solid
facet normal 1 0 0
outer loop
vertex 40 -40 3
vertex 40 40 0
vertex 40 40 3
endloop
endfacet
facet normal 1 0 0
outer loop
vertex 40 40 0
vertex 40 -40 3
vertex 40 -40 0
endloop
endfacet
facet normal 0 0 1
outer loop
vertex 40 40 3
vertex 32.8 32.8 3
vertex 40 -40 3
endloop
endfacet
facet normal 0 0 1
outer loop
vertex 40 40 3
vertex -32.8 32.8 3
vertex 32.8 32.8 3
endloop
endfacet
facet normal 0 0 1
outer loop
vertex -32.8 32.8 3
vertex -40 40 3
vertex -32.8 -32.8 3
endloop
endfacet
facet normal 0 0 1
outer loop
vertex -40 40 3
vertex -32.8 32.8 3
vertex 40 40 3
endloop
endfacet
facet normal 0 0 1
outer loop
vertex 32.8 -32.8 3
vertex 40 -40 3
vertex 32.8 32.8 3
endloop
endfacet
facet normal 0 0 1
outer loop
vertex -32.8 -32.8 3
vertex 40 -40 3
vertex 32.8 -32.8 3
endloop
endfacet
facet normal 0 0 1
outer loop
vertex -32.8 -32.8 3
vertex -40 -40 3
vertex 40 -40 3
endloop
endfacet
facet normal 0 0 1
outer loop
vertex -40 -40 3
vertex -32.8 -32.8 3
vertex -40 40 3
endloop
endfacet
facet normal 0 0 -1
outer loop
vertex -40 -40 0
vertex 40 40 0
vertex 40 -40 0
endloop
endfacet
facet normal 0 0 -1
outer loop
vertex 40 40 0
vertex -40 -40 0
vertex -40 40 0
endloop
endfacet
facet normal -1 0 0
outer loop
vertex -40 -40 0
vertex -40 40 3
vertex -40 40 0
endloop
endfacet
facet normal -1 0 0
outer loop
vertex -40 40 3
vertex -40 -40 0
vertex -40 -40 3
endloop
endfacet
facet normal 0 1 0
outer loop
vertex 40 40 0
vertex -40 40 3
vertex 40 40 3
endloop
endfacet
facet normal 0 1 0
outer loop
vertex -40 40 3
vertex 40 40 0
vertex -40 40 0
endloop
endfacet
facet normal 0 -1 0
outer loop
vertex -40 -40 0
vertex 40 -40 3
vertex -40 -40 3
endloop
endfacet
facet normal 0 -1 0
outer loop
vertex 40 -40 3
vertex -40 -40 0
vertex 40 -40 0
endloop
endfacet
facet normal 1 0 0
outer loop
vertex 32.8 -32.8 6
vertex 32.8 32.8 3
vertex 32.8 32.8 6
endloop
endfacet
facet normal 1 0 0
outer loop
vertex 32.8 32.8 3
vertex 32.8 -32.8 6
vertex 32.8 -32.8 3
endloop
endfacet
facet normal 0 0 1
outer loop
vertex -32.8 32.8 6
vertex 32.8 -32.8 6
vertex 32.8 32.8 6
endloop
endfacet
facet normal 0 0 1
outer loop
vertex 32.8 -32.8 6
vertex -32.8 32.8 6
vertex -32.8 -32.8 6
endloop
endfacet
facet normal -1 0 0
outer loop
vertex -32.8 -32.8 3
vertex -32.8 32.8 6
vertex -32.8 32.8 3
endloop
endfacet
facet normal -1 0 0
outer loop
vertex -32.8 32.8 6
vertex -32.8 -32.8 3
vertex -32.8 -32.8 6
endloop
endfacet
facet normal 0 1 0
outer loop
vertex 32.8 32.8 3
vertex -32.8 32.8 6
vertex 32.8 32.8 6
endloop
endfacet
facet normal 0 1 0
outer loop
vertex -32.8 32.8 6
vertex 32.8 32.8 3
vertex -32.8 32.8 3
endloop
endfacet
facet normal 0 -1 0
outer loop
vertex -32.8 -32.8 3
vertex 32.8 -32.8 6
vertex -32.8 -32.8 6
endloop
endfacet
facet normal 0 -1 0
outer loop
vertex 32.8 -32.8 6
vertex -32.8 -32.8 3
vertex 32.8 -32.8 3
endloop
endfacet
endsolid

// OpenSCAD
//////////VARIABLE DECLARATIONS//////////

//preview[view:north east, tilt: top diagonal]

//QR Code Data Display Method
add_sub = 2; //[1:Subtract QR Geometry,2:Add QR Geometry]

//QR Code Mirroring. No: QR code is scanable from top of object. Yes: QR code is scanable from bottom of object. NOTE: Code is already flipped for iPhone cases so it will be scanable from back of iPhone case.
code_flip = 0; //[0:No,1:Yes]

//Select Main Object
obj = 1; //[0:QR data only,1:Rectangle,2:iPhone 4,3:iPhone 5,4:Rectangle with hole]

//Thickness option for iPhone cases
case_thickness = 1.8; //[1.8:Slim,2.4:Sturdy]

//For rectangles only (will also round perimeters)
round_corner = 1; //[1:No,2:Yes]

//Two opposite corners or all four corners
corner_num = 0; //[0:Two,1:Four]

//For rectangles and perimeters only (will also round perimeters) (mm)
corner_radius = 10; 

//Width of object (mm)
tag_width = 80;

//Height of object (mm)
tag_height = 80;

//Thickness of object (mm)
tag_thickness = 3;

//X Location of hole center (for rectangle with hole) (mm)
hole_x = 30;

//Y Location of hole center (for rectanlge with hole) (mm)
hole_y = 0;

//Radius of hole (for rectanlge with hole) (mm)
hole_r = 10;

//Distance from tag edge. "-1000" for none. (works with all models, but uses tag_width, tag_height plus perimeter dimensions for size) (mm)
perimeter = -1000;

//Wall thickness of perimeter (mm)
per_w = 3;

//Wall height of perimeter (mm)
per_h = 10;

//Scale multiplier for code (base size: 1mm cubes make each code block) (multiplier)
qr_scale = 1.6;

//(DO NOT PUT IN 0 customizer won't generate stl, instead put in a very small value like 0.001 for no tolerance) Use for making a positive and negative assembly (+val makes code blocks bigger) (mm)
qr_tolerance = 0.001;

//X location of QR code center (mm)
qr_x = 0;

//Y location of QR code center (mm)
qr_y = 0;

//Z location of bottom of QR code gemometry (mm)
qr_bottom = 1;

//Thickness of QR code (mm)
qr_thickness = 5;

//Rotate QR code around z-axis (deg)
qr_rotate = 0;

//Input from data generator for dimention of QR code (copy and paste from QR SIZE.txt)
qr_size = 41;

//Input raw QR data matrix here (copy and paste from QR DATA.txt) ("5" will make a rectangle the size of the QR code bounding box driven by qr_size value entered above. NOTE: rectangle will be slightly larger than actual code data due to "white" pixels around QR code in image)
qr_data = 5;

qr_num = qr_size*qr_size;


//////////GEOMETRY MANIPULATION//////////

//Just qr data
if (obj == 0)
{
	qr_mover(qr_x, qr_y, qr_bottom, qr_rotate, qr_scale);
	if (perimeter != -1000)
	{
		perimeter();
	}
}

//Basic rectangle tag
if (obj == 1)
{
	if (add_sub == 1)
	{
		difference()
		{
			rec_tag(tag_width, tag_height, tag_thickness);
			qr_mover(qr_x, qr_y, qr_bottom, qr_rotate, qr_scale);
		}
	}
	if (add_sub == 2)
	{
		union()
		{
			rec_tag(tag_width, tag_height, tag_thickness);
			qr_mover(qr_x, qr_y, qr_bottom, qr_rotate, qr_scale);
		}
	}
	if (perimeter != -1000)
	{
		perimeter();
	}
}

//iPhone 4
if(obj == 2)
{
	if (add_sub == 1)
	{
		difference()
		{
			iPhone4Case();
			translate([0,0,qr_thickness-.1])
			rotate([180,0,0])
			qr_mover(qr_x, qr_y, qr_bottom, qr_rotate, qr_scale);
		}
	}
	if (add_sub == 2)
	{
		union()
		{
			iPhone4Case();
			translate([0,0,qr_thickness-.1])
			rotate([180,0,0])
			qr_mover(qr_x, qr_y, qr_bottom, qr_rotate, qr_scale);
		}
	}
}


//iPhone 5
if(obj == 3)
{
	if (add_sub == 1)
	{
		difference()
		{
			iPhone5Case();
			translate([0,0,qr_thickness-.1])
			rotate([180,0,0])
			qr_mover(qr_x, qr_y, qr_bottom, qr_rotate, qr_scale);
		}
	}
	if (add_sub == 2)
	{
		union()
		{
			iPhone5Case();
			translate([0,0,qr_thickness-.1])
			rotate([180,0,0])
			qr_mover(qr_x, qr_y, qr_bottom, qr_rotate, qr_scale);
		}
	}
}


//Rectangle with hole
if (obj == 4)
{
	if (add_sub == 1)
	{
		difference()
		{
			rec_tag(tag_width, tag_height, tag_thickness);
			qr_mover(qr_x, qr_y, qr_bottom, qr_rotate, qr_scale);
			translate([hole_x, hole_y, 1])
			cylinder(h=(2*tag_thickness), r=hole_r, center=true);
		}
	}
	if (add_sub == 2)
	{
		difference()
		{
			union()
			{
				rec_tag(tag_width, tag_height, tag_thickness);
				qr_mover(qr_x, qr_y, qr_bottom, qr_rotate, qr_scale);
			}
			translate([hole_x, hole_y, 1])
			cylinder(h=(2*tag_thickness), r=hole_r, center=true);
		}
	}
	if (perimeter != -1000)
	{
		perimeter();
	}
}


//////////MODULE DEFINITIONS//////////

module qr_volume(size, num, data, thickness, tol)
{
	if (qr_data == 5)
	{
		color("Snow")
		translate([0, 0, thickness/2])
		cube([size, size, thickness], center=true);
	}
	else
	{
		color("DarkGrey")
		union()
		{
			for(i = [1:1:num])
			{
				if(data[i-1] == 1)
				{
					translate([(floor(i/size)-(qr_size/2)),(i-(size*floor(i/size))-1-(qr_size/2)), 0])
					cube([1+tol, 1+tol, thickness],center=[.5,.5,0]);
				}
			}
		}
	}
}

module qr_mover(x, y, z, rotate, scale)
{
	translate([x,y,z])
	rotate([0, 0, rotate])
	scale([scale, scale, 1])
	mirror([0, code_flip, 0])
	qr_volume(qr_size, qr_num, qr_data, qr_thickness, qr_tolerance);
}

module corner_rounder(w, h, t)
{
	for (c = [0:1:corner_num])
	{
		union()
		{
			mirror([0, c, 0])
			difference()
			{
				translate([w/2, h/2, t/2])
				cylinder(h=t*2, r=corner_radius, center=true);
				translate([(w/2)-corner_radius, (h/2)-corner_radius, t/2])
				cylinder(h=t*3, r=corner_radius, center=true);
			}
			mirror([0, c, 0])
			difference()
			{
				translate([-w/2, -h/2, t/2])
				cylinder(h=t*2, r=corner_radius, center=true);
				translate([-(w/2)+corner_radius, -(h/2)+corner_radius, t/2])
				cylinder(h=t*3, r=corner_radius, center=true);
			}
		}
	}
}

module rec_tag(t_w, t_h, t_t)
{
	difference()
	{
		translate([0, 0, (t_t/2)])
		cube([t_w, t_h, t_t], center=true);
		if (round_corner == 2)
		{
			corner_rounder(t_w, t_h, t_t);
		}
	}
}

module perimeter()
{
	difference()
	{
		rec_tag(tag_width+perimeter+per_w, tag_height+perimeter+per_w, per_h);
		translate([0, 0, -1])
		rec_tag(tag_width+perimeter, tag_height+perimeter, per_h+2);
	}
}




//////////MAKERBOT IPHONE CASE//////////


/*Non customizer variables*/
caseThickness = case_thickness;
caseTolerance = .2/1;

4width=58.55/1;	
4length=115.15/1;
4height=9.34/1;
4cornerR = 8.77/1;
4swidth=6.17/1;
4sthick=.6/1;

5width = 57.57/1;
5length = 122.83/1;
5height = 7.6/1;
5cornerR = 9.28/1;
5sthick = 1.44/1;
5swidth = 5height - 5sthick*1.5;

heightvar=.24/1;

homebuttonR = 5.6/1;
homebuttonD = homebuttonR*2;

top_bottom_opening_width = 50/1;
leftholelength = 25.43/1;
leftholeR = 2.4/1;
topholelength = 38.57/1;
topholeR = 2.5/1;
bottomholelength1 = 43.97/1;
bottomholelength2 = 26.05/1;
bottombigR = 1.53/1;
bottomsmallR = 1.15/1;

corner_resolution = 6/1;
circle_resolution = corner_resolution*4;

fudge = .05/1;


//MODULES

module iPhoneGlass(w, l, h, r)
{
	union(){
		cube([w,l-r*2,h],center = true);
		cube([w-r*2,l,h],center = true);
		//top right corner
		translate([w/2-r,l/2-r,0])
			cylinder(	h = h,
						r = r,
						center = true,
						$fn = circle_resolution);
		//top left corner
		translate([-(w/2-r),l/2-r,0])
			cylinder(	h = h,
						r = r,
						center = true,
						$fn = circle_resolution);
		//bottom right corner
		translate([w/2-r,-(l/2-r),0])
			cylinder(	h = h,
					 	r = r,
						center = true,
						$fn = circle_resolution);
		//bottom left corner
		translate([-(w/2-r),-(l/2-r),0])
			cylinder(	h = h,
						r = r,
						center = true, 
						$fn = circle_resolution);
	}
}

module iPhoneStrip(	w, l, h, r, sw, st)
{
	union(){
		cube([w+st*2,l-r*2,sw],center = true);
		cube([w-r*2,l+st*2,sw],center = true);
		//top right corner
		translate([w/2-r,l/2-r,0])
			cylinder(	h = sw,
						r = r+st,
						center = true,
						$fn = circle_resolution);
		//top left corner
		translate([-(w/2-r),l/2-r,0])
			cylinder(	h = sw,
						r = r+st,
						center = true,
						$fn = circle_resolution);
		//bottom right corner
		translate([w/2-r,-(l/2-r),0])
			cylinder(	h = sw,
						r = r+st,
						center = true,
						$fn = circle_resolution);
		//bottom left corner
		translate([-(w/2-r),-(l/2-r),0])
			cylinder(	h = sw,
						r = r+st,
						center = true,
						$fn = circle_resolution);
	}
}

module iPhoneCameraHole(w,h,r){
	hull(){
		translate([w/2,0,0])
			cylinder(h = h,r = r,center = true, $fn = circle_resolution);
		translate([-w/2,0,0])
			cylinder(h = h,r = r,center = true, $fn = circle_resolution);
	}
}


module iPhone5(w,l,h,cR,sw,st){
	hull(){
		iPhoneGlass(w,l,h,cR);
		iPhoneStrip(w,l,h,cR,sw,st);
	}
}


module iPhone4(w,l,h,cR,sw,st){
	union(){
		hull(){
			iPhoneGlass(w,l,sw+st,cR);
			iPhoneStrip(w,l,h,cR,sw,st);
		}
		iPhoneGlass(w,l,h,cR);
	}
}

module iPhone5Case(){
	translate([0,0,(5height+caseThickness)/2]){
		difference(){
			hull(){
				iPhoneGlass(5width+caseThickness*2,5length+caseThickness*2,5height+caseThickness,5cornerR+caseThickness);
				iPhoneStrip(5width+caseThickness*2,5length+caseThickness*2,5height+caseThickness*2,5cornerR+caseThickness,5swidth,5sthick);
			}
			iPhone5(5width-caseTolerance*3,5length-caseTolerance*2,5height+caseTolerance,5cornerR,5swidth+caseTolerance*2,5sthick+caseTolerance);
			translate([0,0,-5height*.5])
				iPhoneGlass(5width-caseThickness*2,5length-caseThickness*2,5height,5cornerR);
			translate([0,0,5height*.5])
				iPhoneGlass(5width-caseTolerance*3,5length-caseTolerance*2,5height+caseTolerance,5cornerR);
			translate([0,0,caseThickness/2])
			cube([44,5length+20,5height+caseThickness/2],center = true);
			translate([-5width/2-caseThickness*.8,30,4.5])
				rotate([90,0,90])
				scale([1,1,2])
				iPhoneCameraHole(30,caseThickness*2,8);
		}
		difference(){
			union(){
				intersection(){
					translate([0,0,-(5height/2 + caseThickness/4 + caseTolerance/4)])
						iPhoneGlass(5width-caseThickness*2+fudge,5length-caseThickness*2+fudge,caseThickness/2-caseTolerance/2,5cornerR-fudge);
				}
				translate([15,52.4,-(5height/2 + caseThickness/4)])
					iPhoneCameraHole(7.8,caseThickness/2,7.8+1.6);
			}
			translate([15,52.4,-(5height/2 + caseThickness/4)])
				scale([1,1,2])
				iPhoneCameraHole(7.8,caseThickness/2,7.8);
		}
	}	
}

module iPhone4Case(){
	translate([0,0,(4height+caseThickness)/2]){
		difference(){
			hull(){
				iPhoneGlass(4width+caseThickness*2,4length+caseThickness*2,4height+caseThickness,4cornerR+caseThickness);
				iPhoneStrip(4width+caseThickness*2,4length+caseThickness*2,4height+caseThickness*2,4cornerR+caseThickness,4swidth,4sthick);
			}
			iPhone4(4width-caseTolerance*3,4length-caseTolerance*2,4height+caseTolerance,4cornerR,4swidth+caseTolerance*2,4sthick+caseTolerance);
			translate([0,0,4height*.5])
				iPhoneGlass(4width-caseTolerance*3,4length-caseTolerance*2,4height,4cornerR);
			translate([0,0,-4height*.5])
				iPhoneGlass(4width-caseThickness*2,4length-caseThickness*2,4height,4cornerR);
			translate([0,0,caseThickness/2])
			cube([44,4length+20,4height+caseThickness/2],center = true);
			translate([-4width/2-caseThickness*.8,30,5])
				rotate([90,0,90])
				scale([1,1,2])
				iPhoneCameraHole(24,caseThickness*2,8);
		}
		difference(){
			union(){
				intersection(){
					translate([0,0,-(4height/2 + caseThickness/4 + caseTolerance/4)])
						iPhoneGlass(4width-caseThickness*2+fudge,4length-caseThickness*2+fudge,caseThickness/2-caseTolerance/2,4cornerR+fudge);	
				}
				translate([15,48.2,-(4height/2 + caseThickness/4)])
					iPhoneCameraHole(7.8,caseThickness/2,7.8+1.6);
			}
			translate([15,48.2,-(4height/2 + caseThickness/4)])
				scale([1,1,2])
				iPhoneCameraHole(7.8,caseThickness/2,7.8);
		}
	}	
}
